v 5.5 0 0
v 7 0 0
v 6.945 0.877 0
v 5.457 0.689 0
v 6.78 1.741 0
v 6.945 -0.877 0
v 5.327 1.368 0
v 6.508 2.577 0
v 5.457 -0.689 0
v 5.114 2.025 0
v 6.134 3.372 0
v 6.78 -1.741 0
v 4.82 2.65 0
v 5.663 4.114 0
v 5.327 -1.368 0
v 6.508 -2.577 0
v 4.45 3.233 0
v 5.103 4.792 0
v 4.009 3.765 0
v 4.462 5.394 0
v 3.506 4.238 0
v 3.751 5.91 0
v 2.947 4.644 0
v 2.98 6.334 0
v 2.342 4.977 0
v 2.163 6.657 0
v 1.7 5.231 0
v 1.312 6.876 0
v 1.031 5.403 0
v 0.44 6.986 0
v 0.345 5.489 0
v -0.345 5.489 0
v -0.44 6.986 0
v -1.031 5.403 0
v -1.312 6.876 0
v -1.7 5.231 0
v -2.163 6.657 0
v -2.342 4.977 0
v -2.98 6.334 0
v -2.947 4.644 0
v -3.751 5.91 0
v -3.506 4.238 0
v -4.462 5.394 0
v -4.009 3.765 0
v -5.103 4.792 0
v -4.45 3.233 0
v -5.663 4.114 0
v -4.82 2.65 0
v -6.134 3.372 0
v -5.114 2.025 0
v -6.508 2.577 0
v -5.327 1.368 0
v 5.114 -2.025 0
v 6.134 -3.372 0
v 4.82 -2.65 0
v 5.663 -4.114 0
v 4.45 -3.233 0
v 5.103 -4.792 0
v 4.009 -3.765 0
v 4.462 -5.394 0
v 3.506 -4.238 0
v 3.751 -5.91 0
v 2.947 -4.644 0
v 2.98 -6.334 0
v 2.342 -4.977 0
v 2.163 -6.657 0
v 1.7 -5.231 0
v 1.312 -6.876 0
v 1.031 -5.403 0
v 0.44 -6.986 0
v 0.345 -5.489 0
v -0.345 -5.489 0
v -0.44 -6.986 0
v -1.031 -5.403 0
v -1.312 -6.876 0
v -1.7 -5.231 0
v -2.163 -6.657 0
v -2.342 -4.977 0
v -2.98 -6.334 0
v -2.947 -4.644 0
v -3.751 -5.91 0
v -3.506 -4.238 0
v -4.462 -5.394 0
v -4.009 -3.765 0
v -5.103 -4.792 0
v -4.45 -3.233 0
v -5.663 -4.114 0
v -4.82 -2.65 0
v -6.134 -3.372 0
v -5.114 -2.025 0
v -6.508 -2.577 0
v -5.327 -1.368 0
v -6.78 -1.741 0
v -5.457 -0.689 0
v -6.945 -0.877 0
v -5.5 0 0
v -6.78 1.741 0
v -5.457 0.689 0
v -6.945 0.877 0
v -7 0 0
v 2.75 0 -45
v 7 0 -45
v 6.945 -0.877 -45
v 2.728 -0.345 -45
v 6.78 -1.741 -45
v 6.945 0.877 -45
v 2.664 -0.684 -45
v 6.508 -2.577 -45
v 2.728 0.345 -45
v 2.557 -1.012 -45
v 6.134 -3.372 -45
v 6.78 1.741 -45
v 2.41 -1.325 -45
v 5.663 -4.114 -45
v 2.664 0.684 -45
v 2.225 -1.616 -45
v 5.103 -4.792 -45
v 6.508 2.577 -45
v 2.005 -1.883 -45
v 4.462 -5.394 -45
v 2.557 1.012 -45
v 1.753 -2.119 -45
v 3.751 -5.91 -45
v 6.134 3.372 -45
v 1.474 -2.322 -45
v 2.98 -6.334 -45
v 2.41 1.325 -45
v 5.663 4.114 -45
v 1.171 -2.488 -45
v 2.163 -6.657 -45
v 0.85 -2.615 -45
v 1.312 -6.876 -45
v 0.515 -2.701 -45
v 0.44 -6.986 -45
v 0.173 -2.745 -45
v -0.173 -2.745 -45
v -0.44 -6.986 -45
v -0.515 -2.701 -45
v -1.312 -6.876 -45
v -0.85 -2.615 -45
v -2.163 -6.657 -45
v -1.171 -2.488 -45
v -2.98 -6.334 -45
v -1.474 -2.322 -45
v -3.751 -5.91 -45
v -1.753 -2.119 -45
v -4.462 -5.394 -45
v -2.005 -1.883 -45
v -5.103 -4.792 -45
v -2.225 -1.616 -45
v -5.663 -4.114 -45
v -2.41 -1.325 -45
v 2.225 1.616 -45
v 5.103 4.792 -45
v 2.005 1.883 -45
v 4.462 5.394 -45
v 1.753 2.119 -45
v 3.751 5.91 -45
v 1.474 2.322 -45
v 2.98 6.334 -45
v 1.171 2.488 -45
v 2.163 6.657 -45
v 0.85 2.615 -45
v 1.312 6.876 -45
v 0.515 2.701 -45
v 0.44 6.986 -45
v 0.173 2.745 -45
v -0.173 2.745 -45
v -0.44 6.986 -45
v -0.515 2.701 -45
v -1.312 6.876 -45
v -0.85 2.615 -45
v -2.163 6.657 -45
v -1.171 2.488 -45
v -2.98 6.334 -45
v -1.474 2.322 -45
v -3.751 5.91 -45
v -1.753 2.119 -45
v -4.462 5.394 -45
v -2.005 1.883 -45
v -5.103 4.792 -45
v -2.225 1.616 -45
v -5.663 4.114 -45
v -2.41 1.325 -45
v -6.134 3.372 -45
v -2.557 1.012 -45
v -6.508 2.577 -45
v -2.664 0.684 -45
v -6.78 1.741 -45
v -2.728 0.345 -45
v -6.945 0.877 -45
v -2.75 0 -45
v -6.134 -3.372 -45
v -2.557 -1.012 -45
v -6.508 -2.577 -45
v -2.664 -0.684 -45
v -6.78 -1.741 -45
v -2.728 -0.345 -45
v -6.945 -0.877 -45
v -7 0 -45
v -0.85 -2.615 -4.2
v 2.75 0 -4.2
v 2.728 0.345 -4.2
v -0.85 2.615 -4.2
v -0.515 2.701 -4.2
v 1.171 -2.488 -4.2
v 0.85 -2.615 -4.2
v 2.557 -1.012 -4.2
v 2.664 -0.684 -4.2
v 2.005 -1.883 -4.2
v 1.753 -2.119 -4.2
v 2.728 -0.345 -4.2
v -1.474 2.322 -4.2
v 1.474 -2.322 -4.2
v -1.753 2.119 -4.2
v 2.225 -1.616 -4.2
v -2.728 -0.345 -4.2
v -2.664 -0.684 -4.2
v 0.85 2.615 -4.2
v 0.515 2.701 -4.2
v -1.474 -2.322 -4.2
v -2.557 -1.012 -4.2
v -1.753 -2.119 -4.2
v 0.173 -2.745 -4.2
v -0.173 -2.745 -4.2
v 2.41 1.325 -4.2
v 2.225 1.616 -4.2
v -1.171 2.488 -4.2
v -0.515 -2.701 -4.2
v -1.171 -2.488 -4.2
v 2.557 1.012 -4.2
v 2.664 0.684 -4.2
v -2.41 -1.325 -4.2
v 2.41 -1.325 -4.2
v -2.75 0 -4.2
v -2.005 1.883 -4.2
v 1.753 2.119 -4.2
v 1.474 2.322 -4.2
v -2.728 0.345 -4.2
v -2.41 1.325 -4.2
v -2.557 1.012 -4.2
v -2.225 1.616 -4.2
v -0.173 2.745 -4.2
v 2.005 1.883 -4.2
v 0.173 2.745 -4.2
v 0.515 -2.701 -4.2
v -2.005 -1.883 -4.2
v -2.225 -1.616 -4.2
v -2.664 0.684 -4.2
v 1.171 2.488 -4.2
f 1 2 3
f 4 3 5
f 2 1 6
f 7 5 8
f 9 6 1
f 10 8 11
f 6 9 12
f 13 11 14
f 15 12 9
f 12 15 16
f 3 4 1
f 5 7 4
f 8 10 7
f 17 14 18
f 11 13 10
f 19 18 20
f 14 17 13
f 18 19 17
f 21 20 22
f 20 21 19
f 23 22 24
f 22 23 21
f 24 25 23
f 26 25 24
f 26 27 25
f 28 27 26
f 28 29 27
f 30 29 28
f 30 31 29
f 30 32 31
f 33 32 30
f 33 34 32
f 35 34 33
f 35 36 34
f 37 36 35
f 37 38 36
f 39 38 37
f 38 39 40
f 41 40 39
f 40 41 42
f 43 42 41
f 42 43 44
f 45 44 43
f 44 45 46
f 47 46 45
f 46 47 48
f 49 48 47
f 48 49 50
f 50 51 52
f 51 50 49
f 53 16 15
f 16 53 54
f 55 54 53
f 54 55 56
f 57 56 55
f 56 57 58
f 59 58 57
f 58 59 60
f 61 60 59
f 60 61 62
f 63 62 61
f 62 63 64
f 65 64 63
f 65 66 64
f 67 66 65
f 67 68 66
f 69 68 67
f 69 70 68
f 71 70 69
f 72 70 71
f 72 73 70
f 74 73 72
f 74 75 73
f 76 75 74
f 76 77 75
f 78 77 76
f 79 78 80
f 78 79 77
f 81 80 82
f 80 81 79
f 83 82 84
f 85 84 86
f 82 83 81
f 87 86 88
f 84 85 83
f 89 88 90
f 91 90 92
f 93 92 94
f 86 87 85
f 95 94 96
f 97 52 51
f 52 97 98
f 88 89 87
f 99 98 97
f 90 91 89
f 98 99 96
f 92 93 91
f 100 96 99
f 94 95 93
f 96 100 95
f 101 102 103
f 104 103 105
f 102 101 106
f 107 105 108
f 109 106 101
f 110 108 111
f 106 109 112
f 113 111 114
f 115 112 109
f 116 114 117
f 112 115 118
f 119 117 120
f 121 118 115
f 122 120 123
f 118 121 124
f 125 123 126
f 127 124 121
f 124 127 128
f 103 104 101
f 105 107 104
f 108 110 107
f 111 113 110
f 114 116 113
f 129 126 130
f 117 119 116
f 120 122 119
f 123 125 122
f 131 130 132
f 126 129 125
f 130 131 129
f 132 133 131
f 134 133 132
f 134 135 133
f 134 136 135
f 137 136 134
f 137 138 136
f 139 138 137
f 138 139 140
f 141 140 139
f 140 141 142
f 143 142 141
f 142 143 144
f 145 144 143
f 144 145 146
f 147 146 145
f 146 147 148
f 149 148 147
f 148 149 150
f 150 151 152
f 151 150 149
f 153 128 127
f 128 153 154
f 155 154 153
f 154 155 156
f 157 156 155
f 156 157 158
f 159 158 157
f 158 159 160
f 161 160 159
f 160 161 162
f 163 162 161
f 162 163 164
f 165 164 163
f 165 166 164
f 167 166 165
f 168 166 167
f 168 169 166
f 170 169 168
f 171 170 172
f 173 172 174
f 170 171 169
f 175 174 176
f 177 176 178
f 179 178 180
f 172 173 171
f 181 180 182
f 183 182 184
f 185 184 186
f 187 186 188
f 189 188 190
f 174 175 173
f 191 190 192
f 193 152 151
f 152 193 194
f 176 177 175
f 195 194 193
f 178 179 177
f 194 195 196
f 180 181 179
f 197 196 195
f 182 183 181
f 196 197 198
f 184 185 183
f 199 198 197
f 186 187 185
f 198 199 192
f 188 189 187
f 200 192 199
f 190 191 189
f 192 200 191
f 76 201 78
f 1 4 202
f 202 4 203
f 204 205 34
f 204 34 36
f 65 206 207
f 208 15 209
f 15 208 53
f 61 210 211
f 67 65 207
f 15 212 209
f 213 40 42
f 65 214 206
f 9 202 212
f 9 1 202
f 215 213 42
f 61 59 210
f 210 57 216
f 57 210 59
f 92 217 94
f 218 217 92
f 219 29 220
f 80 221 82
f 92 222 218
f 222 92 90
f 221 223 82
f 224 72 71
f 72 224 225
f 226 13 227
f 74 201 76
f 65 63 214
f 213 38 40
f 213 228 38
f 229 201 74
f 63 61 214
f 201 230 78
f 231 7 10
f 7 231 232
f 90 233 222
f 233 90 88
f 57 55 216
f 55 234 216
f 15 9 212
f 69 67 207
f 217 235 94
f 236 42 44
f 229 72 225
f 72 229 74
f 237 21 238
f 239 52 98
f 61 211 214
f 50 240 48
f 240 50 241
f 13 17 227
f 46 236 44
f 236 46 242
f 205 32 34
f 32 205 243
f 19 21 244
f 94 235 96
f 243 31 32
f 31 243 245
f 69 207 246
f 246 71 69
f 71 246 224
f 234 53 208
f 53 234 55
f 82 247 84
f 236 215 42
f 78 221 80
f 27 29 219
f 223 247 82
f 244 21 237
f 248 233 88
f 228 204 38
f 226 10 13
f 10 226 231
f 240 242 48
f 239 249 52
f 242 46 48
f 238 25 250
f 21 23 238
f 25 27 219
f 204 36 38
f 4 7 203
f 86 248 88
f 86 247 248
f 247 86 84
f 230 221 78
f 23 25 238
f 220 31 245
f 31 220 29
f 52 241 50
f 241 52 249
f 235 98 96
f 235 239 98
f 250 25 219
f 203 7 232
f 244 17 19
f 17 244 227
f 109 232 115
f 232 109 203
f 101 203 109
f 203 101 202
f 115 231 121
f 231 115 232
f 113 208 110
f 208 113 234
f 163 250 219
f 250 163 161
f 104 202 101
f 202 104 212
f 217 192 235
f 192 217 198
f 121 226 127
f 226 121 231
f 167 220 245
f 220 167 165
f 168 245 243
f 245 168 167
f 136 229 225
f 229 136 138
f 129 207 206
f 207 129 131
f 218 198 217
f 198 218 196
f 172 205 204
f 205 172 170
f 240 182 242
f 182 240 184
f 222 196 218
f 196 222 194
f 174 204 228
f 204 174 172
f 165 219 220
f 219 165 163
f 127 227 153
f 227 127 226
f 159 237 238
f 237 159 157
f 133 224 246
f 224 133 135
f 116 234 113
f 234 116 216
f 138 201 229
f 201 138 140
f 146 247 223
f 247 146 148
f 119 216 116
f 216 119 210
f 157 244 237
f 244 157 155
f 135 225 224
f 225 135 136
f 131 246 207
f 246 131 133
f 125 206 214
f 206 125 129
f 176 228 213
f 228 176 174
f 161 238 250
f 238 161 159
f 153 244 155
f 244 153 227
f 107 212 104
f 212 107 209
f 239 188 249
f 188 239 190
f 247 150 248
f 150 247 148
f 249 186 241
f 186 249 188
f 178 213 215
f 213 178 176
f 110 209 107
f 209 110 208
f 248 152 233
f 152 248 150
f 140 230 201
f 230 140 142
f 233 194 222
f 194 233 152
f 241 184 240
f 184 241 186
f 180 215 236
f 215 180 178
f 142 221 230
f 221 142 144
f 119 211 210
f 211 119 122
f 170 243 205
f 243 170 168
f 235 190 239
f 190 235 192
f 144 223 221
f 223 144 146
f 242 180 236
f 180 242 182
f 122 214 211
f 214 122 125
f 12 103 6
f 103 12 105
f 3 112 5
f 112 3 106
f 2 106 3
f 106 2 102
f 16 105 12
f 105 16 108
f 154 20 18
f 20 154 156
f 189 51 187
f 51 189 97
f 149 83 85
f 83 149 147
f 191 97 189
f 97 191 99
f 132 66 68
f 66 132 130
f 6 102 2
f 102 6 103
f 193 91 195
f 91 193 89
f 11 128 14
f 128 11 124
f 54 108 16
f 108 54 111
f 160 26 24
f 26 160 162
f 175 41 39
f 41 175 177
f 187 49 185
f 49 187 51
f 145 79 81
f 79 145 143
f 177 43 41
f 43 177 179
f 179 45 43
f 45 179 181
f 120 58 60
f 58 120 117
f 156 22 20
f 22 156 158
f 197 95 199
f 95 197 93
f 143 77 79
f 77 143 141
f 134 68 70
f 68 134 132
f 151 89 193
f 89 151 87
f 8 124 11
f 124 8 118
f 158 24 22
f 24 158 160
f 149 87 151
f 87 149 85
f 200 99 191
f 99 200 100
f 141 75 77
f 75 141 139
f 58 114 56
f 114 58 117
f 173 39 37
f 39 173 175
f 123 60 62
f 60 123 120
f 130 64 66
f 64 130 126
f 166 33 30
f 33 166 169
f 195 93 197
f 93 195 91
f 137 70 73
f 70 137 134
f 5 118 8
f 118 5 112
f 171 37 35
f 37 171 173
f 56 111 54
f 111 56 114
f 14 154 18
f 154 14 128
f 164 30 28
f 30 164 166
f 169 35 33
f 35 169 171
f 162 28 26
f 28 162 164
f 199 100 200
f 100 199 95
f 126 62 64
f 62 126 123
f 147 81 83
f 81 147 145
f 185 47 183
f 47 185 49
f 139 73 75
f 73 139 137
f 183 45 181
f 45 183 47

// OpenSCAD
$fn = 50;


difference() {
	union() {
		translate(v = [0, 0, -45.0000000000]) {
			cylinder(h = 45, r = 7.0000000000);
		}
		cylinder(h = 0, r = 13.0000000000);
	}
	union() {
		translate(v = [0, 0, 0]) {
			rotate(a = [0, 0, 0]) {
				difference() {
					union() {
						#translate(v = [0, 0, -45.0000000000]) {
							cylinder(h = 45, r = 2.2500000000);
						}
						#translate(v = [0, 0, -4.2000000000]) {
							cylinder(h = 4.2000000000, r = 7.0000000000, r1 = 2.7500000000, r2 = 5.5000000000);
						}
						#translate(v = [0, 0, -45.0000000000]) {
							cylinder(h = 45, r = 2.7500000000);
						}
						#translate(v = [0, 0, -45.0000000000]) {
							cylinder(h = 45, r = 2.2500000000);
						}
					}
					union();
				}
			}
		}
	}
}
